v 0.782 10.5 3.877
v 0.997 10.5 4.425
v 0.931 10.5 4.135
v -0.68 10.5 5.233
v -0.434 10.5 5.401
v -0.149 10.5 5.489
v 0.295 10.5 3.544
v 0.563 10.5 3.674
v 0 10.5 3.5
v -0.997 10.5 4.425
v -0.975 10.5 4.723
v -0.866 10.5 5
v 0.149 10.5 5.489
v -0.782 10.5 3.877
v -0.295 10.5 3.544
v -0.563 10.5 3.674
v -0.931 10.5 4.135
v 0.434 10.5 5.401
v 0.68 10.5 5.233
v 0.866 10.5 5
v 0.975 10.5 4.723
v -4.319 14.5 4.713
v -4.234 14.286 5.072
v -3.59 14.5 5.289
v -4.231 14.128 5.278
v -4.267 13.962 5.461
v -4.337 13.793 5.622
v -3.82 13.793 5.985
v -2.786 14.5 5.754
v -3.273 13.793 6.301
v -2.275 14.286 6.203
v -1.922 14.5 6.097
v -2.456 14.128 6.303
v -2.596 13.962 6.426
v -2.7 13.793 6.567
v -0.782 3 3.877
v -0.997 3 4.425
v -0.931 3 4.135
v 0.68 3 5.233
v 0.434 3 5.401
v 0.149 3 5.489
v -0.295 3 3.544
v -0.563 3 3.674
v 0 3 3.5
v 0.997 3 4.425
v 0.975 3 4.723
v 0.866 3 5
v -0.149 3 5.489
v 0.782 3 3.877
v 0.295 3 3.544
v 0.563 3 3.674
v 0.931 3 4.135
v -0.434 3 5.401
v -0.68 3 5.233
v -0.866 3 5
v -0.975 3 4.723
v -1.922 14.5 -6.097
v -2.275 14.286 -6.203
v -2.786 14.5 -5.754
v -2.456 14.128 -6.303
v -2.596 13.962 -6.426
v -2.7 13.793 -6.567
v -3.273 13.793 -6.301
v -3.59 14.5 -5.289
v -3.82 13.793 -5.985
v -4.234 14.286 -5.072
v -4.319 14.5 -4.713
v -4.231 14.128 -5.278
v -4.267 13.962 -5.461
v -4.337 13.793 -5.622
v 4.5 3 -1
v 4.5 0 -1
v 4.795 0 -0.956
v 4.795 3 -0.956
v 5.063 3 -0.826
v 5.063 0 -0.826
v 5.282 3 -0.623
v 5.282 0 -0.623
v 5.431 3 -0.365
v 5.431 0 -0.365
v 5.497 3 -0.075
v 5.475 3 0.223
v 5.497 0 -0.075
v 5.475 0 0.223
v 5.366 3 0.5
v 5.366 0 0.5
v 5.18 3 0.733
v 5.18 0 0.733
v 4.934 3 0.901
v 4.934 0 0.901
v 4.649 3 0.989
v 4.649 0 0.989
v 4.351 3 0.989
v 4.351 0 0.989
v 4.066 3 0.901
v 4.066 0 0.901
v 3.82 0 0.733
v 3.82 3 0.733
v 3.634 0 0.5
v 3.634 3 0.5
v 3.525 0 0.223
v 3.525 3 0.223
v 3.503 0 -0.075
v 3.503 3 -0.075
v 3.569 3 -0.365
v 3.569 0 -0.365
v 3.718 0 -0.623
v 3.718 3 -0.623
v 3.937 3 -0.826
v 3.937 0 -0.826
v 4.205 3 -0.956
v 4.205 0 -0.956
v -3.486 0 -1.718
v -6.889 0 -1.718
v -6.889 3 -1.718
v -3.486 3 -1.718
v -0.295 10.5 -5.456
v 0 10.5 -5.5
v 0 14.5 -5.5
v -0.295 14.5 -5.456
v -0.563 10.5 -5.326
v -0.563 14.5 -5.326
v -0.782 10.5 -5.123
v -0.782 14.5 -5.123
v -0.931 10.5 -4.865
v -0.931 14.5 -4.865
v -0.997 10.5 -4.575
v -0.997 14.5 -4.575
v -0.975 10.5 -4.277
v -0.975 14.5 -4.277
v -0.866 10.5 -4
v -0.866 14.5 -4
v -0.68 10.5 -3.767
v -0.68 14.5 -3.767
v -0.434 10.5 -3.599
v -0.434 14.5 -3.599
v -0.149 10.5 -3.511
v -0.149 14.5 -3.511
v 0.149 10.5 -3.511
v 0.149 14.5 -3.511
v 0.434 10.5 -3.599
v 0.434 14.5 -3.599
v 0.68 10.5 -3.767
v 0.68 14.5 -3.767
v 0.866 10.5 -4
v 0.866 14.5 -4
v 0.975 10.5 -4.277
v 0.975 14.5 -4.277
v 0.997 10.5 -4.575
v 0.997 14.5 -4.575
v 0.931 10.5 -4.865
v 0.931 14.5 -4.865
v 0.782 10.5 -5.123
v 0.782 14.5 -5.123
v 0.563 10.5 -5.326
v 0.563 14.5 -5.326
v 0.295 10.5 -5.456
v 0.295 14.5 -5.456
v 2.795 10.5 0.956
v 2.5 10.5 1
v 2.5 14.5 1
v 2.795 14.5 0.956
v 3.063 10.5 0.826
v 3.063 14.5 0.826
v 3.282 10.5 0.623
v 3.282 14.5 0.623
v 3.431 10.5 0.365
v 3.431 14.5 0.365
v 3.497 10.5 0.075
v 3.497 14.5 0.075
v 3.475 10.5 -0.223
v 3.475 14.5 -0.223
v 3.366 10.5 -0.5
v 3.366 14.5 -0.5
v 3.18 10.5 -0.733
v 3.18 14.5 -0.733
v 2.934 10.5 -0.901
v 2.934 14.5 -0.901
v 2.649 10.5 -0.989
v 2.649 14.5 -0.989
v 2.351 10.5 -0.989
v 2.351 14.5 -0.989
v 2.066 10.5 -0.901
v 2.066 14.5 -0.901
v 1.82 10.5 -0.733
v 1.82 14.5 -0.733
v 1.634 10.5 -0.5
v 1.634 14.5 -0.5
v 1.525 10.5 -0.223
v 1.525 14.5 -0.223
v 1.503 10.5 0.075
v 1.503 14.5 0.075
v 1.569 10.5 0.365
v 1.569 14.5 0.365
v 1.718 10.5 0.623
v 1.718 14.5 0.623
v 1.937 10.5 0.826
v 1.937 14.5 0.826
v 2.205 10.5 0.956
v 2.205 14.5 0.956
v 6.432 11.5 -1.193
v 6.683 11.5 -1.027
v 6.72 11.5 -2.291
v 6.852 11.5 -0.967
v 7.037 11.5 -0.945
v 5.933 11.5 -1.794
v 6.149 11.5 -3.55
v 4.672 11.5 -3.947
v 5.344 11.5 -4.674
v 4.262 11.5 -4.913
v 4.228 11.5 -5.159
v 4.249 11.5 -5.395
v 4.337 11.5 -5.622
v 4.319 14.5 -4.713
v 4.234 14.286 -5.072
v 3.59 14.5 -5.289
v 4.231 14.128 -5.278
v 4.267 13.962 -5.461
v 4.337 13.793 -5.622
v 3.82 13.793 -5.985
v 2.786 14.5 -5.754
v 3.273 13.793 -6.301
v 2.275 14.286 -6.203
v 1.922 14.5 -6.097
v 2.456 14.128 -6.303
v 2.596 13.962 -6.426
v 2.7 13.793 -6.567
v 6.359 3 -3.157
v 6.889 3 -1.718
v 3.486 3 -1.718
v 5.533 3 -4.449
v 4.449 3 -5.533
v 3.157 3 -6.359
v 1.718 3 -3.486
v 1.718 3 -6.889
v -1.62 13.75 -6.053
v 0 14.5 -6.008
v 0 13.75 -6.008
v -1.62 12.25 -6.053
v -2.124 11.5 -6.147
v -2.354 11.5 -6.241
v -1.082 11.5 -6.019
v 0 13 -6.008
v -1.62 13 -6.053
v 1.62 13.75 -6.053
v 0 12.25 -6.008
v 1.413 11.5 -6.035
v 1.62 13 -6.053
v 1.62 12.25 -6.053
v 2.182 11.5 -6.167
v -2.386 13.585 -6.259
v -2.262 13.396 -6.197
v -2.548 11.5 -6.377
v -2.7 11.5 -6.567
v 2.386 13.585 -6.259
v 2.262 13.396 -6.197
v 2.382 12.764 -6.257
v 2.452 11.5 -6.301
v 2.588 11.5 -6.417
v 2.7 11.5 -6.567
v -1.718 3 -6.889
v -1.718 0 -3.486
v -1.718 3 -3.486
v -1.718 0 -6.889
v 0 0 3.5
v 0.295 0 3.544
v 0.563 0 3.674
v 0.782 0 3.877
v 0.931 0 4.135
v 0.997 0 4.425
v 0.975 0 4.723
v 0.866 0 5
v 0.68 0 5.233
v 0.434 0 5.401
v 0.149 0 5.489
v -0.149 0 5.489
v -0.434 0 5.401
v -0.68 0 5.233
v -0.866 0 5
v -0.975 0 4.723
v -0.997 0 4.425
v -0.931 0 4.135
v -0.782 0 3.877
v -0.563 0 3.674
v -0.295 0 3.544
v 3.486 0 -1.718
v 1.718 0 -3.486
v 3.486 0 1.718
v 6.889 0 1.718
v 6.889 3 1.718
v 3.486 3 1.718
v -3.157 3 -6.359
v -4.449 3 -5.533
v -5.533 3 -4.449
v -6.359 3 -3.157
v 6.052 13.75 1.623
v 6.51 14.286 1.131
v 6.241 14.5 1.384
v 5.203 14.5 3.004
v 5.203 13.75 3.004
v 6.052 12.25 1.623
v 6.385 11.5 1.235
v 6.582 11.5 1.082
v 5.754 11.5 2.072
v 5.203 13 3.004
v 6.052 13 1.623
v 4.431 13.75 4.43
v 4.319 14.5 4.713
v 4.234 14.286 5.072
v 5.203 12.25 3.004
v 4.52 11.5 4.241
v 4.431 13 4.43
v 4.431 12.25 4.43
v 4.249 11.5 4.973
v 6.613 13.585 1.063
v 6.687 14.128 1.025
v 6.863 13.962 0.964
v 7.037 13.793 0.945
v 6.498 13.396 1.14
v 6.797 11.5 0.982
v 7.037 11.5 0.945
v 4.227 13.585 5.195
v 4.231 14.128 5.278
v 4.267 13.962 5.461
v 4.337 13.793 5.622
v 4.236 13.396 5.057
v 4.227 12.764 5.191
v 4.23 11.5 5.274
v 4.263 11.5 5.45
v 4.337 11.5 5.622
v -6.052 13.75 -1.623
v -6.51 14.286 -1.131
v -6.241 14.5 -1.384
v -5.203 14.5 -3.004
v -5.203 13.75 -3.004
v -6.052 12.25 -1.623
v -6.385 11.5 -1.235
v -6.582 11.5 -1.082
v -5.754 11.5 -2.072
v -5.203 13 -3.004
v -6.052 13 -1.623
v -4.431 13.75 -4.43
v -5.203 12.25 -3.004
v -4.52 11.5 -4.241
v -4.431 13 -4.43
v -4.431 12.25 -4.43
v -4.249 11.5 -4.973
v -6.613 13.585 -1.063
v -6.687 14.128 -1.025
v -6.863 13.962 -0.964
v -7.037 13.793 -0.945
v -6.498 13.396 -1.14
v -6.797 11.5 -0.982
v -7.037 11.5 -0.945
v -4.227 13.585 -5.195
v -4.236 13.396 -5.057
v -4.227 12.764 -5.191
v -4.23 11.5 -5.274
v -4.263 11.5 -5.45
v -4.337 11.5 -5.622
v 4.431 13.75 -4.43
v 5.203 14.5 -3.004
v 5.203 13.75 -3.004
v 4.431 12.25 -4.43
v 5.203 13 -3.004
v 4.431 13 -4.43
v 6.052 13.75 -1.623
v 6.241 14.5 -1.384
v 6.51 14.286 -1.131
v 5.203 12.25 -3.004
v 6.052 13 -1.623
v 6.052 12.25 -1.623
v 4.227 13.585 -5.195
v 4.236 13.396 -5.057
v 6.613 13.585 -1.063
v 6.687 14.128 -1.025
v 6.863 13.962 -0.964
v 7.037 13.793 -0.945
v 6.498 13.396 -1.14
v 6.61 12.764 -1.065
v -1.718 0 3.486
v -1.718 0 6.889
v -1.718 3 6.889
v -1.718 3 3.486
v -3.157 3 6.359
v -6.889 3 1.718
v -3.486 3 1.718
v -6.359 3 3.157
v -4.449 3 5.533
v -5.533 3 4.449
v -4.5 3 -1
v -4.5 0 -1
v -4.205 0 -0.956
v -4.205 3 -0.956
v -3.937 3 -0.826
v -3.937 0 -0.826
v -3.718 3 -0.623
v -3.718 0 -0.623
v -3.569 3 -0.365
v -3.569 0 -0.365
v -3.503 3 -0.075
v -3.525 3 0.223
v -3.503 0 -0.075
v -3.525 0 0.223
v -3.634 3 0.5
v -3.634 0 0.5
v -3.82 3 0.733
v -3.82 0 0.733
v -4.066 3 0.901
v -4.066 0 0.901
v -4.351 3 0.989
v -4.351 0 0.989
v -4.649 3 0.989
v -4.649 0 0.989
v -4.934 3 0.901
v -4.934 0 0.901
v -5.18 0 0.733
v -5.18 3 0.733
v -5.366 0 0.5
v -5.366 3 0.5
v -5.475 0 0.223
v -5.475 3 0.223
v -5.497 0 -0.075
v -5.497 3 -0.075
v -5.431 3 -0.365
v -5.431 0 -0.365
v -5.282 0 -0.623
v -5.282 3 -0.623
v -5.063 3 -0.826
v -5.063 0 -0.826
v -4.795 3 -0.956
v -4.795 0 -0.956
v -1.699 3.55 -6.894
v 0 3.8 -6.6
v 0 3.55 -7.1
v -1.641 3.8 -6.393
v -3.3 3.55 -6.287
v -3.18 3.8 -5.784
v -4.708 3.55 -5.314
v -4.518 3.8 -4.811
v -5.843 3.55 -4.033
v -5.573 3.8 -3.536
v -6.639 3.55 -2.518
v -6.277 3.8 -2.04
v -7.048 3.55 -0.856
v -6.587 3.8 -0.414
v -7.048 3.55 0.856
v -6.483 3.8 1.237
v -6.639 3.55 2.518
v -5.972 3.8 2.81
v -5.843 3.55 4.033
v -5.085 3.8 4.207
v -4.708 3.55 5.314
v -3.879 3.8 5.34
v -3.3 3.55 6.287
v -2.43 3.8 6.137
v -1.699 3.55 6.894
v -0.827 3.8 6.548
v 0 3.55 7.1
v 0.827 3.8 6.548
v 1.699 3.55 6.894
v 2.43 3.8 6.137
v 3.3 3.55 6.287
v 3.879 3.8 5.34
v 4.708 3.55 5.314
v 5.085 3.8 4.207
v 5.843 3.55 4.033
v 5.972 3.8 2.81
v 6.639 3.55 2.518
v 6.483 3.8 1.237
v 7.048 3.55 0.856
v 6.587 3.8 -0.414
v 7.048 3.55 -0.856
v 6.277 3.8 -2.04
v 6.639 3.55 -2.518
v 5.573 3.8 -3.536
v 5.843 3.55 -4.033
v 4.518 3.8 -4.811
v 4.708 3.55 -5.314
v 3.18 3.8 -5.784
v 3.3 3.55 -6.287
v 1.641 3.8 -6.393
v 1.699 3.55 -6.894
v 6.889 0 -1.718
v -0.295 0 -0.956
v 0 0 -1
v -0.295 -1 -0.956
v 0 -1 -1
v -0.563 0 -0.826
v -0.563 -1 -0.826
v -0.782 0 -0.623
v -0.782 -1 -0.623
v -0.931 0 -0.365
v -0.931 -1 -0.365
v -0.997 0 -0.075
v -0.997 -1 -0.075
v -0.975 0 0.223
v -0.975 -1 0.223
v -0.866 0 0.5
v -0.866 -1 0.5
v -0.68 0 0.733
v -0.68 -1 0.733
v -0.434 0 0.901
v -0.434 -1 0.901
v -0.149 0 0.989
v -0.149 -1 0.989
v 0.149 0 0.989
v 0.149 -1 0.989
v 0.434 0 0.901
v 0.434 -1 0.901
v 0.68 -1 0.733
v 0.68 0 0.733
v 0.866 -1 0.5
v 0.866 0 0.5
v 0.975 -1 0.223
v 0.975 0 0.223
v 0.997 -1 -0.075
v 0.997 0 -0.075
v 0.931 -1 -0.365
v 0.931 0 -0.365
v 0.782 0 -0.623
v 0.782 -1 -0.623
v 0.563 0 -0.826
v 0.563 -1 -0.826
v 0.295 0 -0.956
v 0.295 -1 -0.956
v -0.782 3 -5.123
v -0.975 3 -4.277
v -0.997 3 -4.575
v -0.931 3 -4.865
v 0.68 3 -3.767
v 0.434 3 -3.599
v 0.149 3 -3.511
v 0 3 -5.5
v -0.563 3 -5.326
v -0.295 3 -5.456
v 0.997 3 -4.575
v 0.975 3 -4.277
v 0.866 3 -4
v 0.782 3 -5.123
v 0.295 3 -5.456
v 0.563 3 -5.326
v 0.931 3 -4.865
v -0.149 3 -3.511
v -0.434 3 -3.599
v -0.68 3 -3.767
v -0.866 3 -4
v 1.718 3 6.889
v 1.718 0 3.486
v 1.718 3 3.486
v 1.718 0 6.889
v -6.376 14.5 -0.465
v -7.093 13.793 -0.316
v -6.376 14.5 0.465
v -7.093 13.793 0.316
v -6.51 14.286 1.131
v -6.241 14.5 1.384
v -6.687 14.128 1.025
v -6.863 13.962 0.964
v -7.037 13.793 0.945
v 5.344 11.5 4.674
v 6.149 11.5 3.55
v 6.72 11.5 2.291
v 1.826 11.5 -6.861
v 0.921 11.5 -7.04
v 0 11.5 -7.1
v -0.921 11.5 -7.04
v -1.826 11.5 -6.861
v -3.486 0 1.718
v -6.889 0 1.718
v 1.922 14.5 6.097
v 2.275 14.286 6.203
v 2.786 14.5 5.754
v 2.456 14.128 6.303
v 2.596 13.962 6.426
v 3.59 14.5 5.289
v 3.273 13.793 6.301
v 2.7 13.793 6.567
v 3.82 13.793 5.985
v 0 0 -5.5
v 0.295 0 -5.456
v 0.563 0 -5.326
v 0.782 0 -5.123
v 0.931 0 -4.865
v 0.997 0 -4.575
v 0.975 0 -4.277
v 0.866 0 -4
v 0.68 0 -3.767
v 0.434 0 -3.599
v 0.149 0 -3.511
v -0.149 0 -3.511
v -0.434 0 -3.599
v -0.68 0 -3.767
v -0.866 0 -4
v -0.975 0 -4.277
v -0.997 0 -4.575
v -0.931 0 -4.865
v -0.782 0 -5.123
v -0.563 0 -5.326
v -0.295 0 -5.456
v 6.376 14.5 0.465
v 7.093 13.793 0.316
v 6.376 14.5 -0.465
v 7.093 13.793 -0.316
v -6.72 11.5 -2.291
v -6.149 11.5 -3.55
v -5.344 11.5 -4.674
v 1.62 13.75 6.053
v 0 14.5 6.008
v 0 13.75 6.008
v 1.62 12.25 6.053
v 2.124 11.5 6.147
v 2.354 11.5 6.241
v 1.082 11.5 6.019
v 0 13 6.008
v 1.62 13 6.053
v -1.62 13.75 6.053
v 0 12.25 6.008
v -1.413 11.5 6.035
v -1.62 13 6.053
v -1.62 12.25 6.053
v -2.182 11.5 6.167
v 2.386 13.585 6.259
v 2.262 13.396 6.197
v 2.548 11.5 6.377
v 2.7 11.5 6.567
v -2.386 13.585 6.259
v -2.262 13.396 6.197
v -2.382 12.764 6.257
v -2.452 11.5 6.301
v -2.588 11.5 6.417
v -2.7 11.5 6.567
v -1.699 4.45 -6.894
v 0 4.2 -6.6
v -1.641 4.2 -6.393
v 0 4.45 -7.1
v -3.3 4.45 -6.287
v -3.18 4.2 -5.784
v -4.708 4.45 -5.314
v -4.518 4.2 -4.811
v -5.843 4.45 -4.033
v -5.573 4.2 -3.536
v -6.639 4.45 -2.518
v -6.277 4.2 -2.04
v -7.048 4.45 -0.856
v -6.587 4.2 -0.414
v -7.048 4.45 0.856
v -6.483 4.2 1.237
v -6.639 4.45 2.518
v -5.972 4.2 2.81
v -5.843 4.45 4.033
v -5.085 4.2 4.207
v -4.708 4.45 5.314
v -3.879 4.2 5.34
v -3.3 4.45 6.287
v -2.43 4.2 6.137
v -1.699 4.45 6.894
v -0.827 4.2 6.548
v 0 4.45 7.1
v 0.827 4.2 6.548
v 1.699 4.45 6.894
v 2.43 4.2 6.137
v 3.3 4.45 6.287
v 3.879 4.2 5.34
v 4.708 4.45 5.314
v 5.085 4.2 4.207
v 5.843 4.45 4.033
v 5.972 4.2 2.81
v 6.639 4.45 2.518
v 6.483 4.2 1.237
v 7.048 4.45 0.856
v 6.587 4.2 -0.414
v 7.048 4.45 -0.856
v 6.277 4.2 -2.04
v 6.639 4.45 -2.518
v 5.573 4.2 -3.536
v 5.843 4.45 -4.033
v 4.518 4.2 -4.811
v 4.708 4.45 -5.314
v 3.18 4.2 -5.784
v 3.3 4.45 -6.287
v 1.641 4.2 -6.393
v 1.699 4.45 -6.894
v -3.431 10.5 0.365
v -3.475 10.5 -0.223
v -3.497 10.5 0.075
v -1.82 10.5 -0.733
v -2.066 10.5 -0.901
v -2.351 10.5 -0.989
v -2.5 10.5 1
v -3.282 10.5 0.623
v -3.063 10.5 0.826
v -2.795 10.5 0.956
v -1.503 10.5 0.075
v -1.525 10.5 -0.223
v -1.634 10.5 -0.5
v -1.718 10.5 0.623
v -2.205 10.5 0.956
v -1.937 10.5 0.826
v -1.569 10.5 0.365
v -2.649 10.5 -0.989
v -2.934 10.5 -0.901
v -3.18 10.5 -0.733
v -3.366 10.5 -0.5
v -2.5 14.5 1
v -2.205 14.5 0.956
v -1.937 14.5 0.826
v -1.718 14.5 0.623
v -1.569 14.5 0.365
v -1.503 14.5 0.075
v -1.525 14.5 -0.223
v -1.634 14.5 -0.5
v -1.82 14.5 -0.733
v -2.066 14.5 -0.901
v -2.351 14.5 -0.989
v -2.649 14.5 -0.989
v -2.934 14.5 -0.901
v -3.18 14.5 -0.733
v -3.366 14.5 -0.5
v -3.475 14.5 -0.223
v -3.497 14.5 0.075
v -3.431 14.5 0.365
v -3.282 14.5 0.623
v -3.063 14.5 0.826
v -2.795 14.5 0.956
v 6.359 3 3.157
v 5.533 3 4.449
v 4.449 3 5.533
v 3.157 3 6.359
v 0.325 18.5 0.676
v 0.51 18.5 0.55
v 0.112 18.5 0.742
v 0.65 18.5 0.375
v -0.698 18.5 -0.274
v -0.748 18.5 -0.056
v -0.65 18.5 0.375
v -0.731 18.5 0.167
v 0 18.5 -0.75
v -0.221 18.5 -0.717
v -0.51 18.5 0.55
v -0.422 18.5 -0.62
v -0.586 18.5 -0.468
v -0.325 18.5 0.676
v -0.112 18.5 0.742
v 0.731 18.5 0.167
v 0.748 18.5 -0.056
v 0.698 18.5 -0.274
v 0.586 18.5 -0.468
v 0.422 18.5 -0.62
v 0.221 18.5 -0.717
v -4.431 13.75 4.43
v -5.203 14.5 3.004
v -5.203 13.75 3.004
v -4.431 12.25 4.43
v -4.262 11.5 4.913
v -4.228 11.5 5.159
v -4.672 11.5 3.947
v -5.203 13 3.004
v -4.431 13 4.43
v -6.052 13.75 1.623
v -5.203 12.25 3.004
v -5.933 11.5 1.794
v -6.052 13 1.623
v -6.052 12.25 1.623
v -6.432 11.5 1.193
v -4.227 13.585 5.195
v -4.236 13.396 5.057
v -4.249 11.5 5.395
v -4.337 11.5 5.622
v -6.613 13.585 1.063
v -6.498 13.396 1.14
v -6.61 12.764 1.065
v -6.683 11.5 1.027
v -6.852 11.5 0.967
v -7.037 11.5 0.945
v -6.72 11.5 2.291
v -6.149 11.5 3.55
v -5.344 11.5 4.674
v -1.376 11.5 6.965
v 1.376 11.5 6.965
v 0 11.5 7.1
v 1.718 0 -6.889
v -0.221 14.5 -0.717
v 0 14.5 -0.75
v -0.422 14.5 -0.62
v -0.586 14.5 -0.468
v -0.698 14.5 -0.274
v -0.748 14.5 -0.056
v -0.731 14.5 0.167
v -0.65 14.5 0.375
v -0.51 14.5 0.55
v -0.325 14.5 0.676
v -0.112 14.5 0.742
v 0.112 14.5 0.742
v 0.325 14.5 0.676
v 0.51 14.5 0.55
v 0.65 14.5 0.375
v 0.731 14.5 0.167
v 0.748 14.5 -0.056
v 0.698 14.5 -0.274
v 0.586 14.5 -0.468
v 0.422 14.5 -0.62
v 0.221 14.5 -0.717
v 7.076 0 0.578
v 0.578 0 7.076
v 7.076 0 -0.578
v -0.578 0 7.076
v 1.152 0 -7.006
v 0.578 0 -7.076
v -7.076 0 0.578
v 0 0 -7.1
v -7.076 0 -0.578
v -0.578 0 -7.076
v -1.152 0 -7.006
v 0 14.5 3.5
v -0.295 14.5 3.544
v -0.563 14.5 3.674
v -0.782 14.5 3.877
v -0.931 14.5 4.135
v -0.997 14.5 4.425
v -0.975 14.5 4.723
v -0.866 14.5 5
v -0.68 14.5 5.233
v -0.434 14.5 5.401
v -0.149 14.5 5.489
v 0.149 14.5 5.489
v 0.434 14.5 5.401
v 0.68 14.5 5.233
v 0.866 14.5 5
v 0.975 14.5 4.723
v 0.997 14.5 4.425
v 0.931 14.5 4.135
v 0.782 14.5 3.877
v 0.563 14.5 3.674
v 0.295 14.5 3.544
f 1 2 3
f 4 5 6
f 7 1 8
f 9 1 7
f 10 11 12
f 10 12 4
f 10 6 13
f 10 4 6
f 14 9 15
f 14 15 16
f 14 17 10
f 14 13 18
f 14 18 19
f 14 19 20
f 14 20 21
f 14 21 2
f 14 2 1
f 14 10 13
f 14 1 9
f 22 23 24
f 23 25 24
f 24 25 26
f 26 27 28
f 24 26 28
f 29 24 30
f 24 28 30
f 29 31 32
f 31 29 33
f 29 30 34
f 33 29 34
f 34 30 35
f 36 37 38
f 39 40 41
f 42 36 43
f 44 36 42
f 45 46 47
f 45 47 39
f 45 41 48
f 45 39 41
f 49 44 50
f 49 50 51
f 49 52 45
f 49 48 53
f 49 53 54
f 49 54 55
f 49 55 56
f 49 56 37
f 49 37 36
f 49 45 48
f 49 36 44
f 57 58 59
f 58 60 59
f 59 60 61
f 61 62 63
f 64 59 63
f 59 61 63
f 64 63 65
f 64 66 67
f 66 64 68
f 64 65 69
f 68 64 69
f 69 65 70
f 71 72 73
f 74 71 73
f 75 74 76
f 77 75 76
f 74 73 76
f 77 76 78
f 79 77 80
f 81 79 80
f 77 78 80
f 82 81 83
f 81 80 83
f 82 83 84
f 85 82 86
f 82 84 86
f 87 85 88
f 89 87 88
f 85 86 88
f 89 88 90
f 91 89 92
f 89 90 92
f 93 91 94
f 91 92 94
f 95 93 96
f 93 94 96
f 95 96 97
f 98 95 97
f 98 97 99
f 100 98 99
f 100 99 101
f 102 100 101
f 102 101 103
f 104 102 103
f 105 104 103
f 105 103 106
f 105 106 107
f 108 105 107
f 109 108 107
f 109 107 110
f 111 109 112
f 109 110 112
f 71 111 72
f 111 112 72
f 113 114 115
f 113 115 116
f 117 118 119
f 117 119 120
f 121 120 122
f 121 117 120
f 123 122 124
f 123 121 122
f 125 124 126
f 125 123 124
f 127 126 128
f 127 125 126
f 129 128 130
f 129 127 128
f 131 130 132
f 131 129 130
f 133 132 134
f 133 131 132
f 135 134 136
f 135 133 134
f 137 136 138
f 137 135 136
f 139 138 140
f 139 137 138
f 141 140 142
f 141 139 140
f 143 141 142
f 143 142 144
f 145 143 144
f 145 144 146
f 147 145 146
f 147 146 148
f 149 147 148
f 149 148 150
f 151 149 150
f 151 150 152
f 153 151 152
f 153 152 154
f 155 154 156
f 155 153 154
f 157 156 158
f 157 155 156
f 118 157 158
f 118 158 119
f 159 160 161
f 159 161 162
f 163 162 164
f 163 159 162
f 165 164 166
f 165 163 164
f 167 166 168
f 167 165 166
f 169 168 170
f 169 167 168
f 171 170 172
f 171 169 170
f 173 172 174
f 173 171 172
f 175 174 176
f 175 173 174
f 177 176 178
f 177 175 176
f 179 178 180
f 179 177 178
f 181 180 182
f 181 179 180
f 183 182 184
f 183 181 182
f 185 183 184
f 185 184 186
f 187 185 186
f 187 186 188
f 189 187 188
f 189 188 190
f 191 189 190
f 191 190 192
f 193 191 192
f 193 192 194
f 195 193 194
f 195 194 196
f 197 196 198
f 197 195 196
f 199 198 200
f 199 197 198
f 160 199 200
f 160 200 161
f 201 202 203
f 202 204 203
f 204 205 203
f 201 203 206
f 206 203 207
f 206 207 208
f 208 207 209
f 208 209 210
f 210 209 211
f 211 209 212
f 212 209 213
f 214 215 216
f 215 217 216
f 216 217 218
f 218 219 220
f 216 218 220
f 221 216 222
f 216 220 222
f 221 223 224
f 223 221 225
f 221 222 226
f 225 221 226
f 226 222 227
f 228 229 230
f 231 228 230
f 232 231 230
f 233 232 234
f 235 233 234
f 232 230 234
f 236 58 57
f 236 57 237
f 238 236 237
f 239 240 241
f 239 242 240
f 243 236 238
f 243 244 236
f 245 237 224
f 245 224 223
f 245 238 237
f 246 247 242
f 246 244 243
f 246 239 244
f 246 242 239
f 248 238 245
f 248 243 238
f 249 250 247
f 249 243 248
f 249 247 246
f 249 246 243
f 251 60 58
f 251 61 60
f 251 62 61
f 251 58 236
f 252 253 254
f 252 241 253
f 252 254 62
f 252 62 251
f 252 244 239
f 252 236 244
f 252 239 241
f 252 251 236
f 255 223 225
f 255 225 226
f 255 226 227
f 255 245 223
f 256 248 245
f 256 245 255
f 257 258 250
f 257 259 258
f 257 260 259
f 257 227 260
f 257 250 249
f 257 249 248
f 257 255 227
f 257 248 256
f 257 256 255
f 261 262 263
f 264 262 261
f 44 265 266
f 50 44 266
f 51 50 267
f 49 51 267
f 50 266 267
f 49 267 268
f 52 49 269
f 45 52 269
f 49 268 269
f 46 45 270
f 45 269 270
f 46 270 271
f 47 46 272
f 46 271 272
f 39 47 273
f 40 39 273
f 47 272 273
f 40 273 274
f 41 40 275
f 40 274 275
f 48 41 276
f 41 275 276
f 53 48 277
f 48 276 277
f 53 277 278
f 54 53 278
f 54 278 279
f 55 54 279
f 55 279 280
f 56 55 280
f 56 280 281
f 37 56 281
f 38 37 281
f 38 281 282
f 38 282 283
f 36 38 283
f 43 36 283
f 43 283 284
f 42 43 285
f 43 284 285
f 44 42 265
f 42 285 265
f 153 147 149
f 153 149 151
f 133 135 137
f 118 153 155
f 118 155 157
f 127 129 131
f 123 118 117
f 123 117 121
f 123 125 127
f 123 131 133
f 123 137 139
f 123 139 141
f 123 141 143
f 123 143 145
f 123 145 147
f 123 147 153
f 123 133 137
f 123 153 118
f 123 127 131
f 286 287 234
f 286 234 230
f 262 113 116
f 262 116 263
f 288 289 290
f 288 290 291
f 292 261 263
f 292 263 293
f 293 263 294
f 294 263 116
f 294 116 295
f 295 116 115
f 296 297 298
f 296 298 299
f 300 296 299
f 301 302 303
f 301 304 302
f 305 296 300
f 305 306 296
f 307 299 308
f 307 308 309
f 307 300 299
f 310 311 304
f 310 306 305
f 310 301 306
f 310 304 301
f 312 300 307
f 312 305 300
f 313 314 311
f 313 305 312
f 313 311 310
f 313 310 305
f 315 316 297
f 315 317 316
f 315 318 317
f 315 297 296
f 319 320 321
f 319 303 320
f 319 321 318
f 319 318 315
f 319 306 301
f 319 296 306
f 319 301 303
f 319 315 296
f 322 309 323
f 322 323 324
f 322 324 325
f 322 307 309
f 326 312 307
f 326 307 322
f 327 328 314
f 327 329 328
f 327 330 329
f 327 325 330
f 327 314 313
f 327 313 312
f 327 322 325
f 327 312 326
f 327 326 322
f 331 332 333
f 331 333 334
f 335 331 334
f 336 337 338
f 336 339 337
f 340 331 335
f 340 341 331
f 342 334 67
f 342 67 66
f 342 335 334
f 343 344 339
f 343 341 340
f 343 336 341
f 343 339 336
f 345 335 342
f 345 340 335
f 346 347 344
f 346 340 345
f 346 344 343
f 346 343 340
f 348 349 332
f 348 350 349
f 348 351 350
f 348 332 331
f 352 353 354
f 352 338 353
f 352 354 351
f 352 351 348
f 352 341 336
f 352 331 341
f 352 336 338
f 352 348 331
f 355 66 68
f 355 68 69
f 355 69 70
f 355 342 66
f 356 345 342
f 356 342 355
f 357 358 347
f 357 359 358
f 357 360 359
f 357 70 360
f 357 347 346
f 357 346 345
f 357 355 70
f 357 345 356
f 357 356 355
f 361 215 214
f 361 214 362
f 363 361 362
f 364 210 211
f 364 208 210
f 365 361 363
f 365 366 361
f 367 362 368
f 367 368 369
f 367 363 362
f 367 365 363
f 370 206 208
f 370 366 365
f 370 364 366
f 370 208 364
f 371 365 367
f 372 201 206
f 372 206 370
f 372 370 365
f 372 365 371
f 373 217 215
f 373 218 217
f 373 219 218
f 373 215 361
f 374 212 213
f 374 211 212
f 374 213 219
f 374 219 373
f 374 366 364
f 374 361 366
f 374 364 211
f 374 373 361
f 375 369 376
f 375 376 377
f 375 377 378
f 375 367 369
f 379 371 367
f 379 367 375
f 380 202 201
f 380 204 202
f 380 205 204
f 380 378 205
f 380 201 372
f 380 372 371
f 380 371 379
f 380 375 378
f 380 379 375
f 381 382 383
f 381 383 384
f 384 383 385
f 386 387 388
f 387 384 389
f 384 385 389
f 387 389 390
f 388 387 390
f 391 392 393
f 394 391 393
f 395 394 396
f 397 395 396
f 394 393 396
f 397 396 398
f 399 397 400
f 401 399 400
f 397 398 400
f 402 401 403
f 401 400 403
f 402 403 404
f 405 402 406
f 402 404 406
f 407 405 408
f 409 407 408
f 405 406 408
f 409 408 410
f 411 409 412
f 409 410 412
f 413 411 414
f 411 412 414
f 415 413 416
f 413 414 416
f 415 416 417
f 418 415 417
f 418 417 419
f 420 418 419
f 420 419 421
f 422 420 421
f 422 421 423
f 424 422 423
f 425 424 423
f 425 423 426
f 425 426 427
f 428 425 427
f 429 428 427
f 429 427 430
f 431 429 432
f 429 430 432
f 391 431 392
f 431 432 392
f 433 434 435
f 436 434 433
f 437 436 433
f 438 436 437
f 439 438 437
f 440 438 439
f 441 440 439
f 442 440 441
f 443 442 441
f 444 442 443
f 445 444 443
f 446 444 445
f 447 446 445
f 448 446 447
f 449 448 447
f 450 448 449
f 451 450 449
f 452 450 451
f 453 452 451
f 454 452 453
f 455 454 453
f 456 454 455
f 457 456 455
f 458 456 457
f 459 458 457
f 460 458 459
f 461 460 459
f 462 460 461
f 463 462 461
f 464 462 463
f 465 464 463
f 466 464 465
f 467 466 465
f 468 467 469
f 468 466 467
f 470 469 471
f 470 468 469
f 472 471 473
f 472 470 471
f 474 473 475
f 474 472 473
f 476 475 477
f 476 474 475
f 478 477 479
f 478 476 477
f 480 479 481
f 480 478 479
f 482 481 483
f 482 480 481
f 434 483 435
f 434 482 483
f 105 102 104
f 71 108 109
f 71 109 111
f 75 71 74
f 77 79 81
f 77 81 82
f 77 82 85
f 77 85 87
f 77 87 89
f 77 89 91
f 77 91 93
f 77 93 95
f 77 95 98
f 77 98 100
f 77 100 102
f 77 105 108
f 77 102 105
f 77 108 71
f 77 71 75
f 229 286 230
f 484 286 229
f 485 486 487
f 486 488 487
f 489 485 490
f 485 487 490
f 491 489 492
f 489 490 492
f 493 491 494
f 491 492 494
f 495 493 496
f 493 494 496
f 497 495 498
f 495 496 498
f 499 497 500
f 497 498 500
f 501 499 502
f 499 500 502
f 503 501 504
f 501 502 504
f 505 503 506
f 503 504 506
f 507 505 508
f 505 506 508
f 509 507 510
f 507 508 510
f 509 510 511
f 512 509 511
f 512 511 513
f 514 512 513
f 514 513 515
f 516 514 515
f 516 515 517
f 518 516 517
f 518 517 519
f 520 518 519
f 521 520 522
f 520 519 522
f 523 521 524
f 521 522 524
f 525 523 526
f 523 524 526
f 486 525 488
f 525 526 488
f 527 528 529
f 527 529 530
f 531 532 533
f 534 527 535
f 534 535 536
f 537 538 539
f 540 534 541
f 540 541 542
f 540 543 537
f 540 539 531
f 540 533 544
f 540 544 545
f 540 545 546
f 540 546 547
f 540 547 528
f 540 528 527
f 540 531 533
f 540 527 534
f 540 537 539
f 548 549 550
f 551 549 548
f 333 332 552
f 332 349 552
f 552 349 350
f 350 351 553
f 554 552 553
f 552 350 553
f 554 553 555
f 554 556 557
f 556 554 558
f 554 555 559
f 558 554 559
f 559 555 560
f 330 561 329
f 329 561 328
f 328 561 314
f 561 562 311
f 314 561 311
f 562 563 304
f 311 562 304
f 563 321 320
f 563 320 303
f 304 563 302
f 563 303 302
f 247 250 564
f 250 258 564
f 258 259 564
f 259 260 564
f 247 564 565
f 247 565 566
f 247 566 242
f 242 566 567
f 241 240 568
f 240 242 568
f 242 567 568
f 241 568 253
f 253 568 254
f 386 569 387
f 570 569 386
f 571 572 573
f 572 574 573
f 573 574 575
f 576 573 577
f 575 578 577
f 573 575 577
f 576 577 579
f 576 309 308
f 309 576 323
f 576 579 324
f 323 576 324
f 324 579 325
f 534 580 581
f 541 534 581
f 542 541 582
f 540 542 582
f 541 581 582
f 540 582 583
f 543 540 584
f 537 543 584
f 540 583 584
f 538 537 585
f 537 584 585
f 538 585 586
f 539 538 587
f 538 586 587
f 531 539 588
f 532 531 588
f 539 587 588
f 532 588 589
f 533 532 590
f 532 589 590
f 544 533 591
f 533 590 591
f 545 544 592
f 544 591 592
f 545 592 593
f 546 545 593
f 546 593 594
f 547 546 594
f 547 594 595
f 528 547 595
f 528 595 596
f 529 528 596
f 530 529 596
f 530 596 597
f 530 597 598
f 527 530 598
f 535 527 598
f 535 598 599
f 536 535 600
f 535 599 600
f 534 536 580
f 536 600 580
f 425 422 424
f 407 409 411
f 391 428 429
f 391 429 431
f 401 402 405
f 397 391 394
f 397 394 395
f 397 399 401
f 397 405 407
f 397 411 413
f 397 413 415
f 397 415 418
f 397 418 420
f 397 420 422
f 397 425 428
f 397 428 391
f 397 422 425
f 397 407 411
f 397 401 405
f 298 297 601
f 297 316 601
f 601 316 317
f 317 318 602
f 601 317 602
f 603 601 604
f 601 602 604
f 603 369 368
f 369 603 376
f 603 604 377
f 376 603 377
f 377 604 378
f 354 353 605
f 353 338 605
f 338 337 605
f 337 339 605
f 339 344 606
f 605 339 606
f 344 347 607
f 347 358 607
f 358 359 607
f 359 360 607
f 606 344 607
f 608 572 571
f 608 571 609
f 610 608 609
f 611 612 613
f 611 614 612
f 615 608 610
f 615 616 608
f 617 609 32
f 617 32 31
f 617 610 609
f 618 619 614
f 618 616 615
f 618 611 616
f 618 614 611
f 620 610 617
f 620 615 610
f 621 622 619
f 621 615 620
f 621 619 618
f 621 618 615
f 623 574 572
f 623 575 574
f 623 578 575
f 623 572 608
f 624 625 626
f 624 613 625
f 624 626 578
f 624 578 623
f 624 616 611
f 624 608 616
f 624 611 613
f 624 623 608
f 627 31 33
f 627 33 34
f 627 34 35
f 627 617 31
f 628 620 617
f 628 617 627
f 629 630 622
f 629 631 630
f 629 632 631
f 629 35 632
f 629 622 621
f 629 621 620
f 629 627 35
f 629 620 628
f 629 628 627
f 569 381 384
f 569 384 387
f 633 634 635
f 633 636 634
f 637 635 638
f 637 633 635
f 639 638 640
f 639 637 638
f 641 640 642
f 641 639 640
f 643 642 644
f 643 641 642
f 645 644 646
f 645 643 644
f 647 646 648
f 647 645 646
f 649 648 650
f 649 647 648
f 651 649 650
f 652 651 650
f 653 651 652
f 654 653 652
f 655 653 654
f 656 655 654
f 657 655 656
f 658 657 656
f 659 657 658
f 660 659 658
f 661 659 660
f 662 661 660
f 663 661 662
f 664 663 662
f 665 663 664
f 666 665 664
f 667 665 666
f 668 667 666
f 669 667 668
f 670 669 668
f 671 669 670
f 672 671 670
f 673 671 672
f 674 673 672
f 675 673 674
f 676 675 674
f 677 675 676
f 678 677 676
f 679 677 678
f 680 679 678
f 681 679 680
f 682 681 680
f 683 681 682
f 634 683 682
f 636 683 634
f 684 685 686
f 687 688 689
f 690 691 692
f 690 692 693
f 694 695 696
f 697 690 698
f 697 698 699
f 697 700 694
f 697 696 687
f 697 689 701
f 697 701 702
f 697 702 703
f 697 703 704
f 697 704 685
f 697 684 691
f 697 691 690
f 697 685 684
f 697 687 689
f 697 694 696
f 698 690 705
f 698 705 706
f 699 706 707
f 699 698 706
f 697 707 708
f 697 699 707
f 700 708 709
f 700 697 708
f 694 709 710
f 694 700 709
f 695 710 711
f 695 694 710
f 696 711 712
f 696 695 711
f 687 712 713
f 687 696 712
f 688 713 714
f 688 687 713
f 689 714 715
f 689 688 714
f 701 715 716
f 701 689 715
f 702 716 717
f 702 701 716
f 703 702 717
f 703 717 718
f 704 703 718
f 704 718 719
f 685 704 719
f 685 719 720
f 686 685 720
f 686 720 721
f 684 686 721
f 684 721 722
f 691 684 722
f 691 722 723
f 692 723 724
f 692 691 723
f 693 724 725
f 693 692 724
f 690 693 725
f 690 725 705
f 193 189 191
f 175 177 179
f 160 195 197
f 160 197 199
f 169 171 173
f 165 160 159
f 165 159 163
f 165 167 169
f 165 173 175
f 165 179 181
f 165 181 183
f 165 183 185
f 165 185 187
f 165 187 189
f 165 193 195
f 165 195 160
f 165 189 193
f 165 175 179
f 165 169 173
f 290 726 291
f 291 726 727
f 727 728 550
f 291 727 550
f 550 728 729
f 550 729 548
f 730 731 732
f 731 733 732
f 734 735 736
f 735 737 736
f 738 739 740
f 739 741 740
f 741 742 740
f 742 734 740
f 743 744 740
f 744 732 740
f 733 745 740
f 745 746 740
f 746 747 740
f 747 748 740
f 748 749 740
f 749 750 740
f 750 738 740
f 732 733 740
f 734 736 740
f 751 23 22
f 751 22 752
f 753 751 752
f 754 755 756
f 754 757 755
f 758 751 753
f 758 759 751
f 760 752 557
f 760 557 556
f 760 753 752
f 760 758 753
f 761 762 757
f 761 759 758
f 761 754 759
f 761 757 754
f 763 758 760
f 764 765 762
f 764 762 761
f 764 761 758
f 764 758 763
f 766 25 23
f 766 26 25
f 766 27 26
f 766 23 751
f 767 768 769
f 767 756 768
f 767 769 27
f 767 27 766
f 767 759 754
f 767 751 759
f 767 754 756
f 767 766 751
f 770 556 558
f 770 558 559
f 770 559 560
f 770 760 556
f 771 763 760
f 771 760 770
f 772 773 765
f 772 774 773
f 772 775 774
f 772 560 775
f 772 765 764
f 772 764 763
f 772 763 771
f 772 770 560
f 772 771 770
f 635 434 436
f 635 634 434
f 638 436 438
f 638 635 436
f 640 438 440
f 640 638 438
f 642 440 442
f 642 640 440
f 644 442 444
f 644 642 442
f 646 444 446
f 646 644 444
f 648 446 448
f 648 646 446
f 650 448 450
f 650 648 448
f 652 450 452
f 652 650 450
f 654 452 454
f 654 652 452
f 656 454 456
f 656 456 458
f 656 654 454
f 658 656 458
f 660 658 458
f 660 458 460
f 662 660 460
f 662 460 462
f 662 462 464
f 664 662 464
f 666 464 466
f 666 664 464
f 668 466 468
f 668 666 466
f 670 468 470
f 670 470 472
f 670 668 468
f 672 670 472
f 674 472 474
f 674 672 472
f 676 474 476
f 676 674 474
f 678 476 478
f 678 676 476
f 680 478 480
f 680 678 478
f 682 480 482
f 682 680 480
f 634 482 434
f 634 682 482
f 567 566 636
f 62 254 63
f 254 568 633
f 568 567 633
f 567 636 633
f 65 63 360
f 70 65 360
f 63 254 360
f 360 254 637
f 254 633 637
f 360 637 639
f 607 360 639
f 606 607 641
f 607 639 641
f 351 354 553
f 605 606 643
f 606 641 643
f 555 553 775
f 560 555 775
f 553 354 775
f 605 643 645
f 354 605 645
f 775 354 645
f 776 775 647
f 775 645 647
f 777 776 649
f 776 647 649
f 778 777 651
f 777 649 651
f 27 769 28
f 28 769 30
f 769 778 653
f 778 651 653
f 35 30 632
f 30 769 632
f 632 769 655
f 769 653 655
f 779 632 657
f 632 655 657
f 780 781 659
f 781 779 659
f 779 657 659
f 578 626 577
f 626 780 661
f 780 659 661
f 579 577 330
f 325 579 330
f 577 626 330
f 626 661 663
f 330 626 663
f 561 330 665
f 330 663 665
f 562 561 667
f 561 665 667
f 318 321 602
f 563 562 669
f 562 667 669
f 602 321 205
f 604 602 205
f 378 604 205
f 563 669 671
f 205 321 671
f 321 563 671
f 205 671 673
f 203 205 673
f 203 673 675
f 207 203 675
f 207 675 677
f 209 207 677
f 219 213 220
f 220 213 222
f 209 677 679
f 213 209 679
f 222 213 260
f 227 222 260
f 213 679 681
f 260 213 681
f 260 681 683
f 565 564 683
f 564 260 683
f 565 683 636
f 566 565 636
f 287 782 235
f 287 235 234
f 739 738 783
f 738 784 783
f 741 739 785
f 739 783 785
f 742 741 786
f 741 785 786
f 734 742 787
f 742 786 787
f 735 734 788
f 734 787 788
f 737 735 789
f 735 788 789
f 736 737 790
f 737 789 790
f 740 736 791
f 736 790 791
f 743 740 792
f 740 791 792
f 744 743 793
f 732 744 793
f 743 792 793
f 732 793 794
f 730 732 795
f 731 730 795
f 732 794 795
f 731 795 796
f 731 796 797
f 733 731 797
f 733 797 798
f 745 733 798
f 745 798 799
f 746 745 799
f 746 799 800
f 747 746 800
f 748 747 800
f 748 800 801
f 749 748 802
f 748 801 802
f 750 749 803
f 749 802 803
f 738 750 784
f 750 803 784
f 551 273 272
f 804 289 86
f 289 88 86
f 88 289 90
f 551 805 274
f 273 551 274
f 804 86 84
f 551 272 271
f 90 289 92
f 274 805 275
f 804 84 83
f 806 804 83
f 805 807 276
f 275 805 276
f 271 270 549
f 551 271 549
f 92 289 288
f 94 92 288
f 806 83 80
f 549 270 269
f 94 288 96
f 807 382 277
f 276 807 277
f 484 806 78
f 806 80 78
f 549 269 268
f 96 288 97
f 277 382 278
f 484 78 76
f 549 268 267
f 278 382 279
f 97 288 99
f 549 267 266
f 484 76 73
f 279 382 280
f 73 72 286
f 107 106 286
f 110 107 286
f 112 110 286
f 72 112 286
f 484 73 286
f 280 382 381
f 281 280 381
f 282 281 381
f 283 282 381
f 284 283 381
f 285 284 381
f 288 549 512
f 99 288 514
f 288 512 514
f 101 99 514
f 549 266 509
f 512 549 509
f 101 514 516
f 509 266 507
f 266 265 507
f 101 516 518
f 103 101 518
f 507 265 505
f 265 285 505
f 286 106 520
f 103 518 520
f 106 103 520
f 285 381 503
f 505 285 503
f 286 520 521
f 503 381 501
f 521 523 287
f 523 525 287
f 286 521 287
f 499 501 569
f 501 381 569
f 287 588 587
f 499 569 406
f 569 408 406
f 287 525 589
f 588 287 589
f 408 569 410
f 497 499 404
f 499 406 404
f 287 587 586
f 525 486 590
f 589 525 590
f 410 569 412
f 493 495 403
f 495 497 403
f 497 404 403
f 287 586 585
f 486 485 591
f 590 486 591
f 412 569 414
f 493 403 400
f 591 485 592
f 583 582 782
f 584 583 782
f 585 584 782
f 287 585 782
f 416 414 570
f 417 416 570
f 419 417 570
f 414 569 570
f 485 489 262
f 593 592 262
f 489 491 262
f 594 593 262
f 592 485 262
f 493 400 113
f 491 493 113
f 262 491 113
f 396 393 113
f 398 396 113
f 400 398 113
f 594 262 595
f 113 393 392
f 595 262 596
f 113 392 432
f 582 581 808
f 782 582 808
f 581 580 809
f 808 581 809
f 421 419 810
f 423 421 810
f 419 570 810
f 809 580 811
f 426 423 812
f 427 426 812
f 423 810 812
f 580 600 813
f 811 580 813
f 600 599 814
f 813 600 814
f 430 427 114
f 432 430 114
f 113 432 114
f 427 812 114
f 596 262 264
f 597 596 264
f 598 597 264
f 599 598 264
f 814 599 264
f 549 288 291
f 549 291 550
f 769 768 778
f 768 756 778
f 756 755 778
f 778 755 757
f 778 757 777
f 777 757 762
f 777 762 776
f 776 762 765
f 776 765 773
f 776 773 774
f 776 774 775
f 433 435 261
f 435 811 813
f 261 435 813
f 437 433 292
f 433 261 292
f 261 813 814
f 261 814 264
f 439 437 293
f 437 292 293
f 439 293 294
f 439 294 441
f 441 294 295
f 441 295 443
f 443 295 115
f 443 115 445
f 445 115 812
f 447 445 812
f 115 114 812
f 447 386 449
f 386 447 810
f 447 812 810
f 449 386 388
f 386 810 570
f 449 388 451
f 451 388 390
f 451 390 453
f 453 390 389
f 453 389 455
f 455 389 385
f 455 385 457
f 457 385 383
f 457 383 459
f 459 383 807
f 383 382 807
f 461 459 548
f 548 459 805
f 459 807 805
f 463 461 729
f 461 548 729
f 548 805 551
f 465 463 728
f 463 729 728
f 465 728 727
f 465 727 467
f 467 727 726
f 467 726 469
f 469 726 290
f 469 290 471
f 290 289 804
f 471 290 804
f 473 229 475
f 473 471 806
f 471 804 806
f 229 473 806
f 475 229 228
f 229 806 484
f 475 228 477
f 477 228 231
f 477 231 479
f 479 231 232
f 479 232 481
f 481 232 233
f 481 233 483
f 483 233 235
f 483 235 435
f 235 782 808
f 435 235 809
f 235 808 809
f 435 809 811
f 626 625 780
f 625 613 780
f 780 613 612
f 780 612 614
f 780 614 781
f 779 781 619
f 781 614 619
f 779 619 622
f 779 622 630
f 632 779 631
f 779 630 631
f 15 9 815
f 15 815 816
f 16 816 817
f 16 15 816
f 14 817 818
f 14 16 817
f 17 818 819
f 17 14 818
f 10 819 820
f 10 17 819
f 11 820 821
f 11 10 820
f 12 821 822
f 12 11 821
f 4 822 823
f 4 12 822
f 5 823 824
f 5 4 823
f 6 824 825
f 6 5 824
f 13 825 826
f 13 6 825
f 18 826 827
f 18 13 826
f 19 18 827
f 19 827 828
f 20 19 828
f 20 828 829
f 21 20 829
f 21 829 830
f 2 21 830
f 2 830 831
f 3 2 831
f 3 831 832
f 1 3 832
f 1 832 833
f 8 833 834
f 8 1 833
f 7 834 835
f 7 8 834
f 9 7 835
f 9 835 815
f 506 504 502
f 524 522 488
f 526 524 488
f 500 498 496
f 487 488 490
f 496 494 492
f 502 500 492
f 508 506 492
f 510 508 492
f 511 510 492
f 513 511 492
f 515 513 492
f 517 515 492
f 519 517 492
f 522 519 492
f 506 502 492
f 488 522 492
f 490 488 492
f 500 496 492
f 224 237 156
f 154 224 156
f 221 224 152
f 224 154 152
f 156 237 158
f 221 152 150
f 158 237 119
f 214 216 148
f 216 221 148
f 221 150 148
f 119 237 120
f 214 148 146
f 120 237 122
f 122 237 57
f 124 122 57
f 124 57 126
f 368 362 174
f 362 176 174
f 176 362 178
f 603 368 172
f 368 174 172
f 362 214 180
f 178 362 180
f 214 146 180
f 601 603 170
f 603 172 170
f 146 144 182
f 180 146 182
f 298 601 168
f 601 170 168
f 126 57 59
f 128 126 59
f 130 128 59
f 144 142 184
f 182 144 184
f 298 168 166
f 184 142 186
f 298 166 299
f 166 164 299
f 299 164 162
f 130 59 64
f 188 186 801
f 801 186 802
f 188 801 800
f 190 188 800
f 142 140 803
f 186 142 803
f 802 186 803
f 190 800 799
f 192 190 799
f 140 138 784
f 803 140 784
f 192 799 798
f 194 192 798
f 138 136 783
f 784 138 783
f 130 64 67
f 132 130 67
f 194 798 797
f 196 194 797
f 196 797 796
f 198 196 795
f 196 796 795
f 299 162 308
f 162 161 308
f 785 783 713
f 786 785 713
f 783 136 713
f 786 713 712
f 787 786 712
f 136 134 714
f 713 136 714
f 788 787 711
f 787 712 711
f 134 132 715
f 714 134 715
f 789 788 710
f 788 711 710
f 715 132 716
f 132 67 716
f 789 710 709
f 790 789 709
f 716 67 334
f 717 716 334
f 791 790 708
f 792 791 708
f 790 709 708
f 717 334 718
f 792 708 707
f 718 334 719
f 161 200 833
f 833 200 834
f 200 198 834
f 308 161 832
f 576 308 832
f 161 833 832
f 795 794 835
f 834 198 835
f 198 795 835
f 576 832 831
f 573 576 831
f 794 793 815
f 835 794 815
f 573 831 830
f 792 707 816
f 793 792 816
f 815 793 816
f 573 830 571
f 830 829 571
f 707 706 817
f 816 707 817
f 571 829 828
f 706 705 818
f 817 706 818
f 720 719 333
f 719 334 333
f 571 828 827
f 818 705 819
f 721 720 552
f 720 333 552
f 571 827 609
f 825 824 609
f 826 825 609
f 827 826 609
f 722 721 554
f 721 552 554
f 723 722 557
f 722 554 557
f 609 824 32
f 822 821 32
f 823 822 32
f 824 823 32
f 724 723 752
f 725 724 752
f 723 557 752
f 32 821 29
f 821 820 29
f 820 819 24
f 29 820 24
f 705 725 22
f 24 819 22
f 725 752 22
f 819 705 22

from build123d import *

# Parameters (mm, degrees)
SKETCH3_R          = 1
CUT_EXTRUDE1_DEPTH = 3
CUT_EXTRUDE2_START = -4
SKETCH4_R          = 1
CUT_EXTRUDE2_DEPTH = 4
CUT_EXTRUDE3_START = -3
CUT_EXTRUDE3_DEPTH = 3
CUT_EXTRUDE4_DEPTH = 3


with BuildPart() as part:
    # Sketch1 → Revolve1 (revolve)
    with BuildSketch(Plane(origin=(0, 0, 0), x_dir=(0, 0, -1), z_dir=(1, 0, 0)), mode=Mode.PRIVATE) as revolve1_sk:
        Polygon((0, 18.5), (-0.75, 18.5), (-0.75, 14.5), (-6.392893219, 14.5), (-7.1, 13.792893219), (-7.1, 0), (-1, 0), (-1, -1), (0, -1), (0, 0), align=None)
    revolve(revolve1_sk.sketch.rotate(Axis((0, 0, 0), (0, 1, 0)), 180), axis=Axis((0, 0, 0), (0, 1, 0)))

    # Sketch3 → Cut-Extrude1 (cut)
    with BuildSketch(Plane.XZ):
        with Locations(Location((0, 4.5, 0), (0, 0, 270))):
            Circle(SKETCH3_R)
        with Locations(Location((4.5, 0, 0), (0, 0, 270))):
            Circle(SKETCH3_R)
        with Locations(Location((-4.5, 0, 0), (0, 0, 270))):
            Circle(SKETCH3_R)
        with Locations(Location((0, -4.5, 0), (0, 0, 270))):
            Circle(SKETCH3_R)
    extrude(amount=-CUT_EXTRUDE1_DEPTH, mode=Mode.SUBTRACT)

    # Sketch4 → Cut-Extrude2 (cut)
    with BuildSketch(Plane(origin=(0, 14.5, 0), x_dir=(1, 0, 0), z_dir=(0, 1, 0)).offset(CUT_EXTRUDE2_START)):
        with Locations(Location((0, 4.5, 0), (0, 0, 90))):
            Circle(SKETCH4_R)
        with Locations(Location((2.5, 0, 0), (0, 0, 270))):
            Circle(SKETCH4_R)
        with Locations(Location((0, -4.5, 0), (0, 0, 90))):
            Circle(SKETCH4_R)
        with Locations(Location((-2.5, 0, 0), (0, 0, 270))):
            Circle(SKETCH4_R)
    extrude(amount=CUT_EXTRUDE2_DEPTH, mode=Mode.SUBTRACT)

    # Sketch5 → Cut-Extrude3 (cut)
    with BuildSketch(Plane(origin=(0, 14.5, 0), x_dir=(1, 0, 0), z_dir=(0, 1, 0)).offset(CUT_EXTRUDE3_START)):
        with BuildLine():
            ThreePointArc((-2.7, 6.566582064), (0, 7.1), (2.7, 6.566582064))
            add(Edge.make_bspline(
                [(-2.7, 6.566582064), (-2.071231518, 5.5), (0, 6.5), (2.071231518, 5.5), (2.7, 6.566582064)],
                knots=[0, 0, 0, 0, 0, 1, 1, 1, 1, 1], degree=4))
        make_face()
        with BuildLine():
            ThreePointArc((4.336826883, 5.621559622), (6.148780367, 3.55), (7.036826883, 0.945022442))
            add(Edge.make_bspline(
                [(4.336826883, 5.621559622), (3.727523962, 4.543739111), (5.629165125, 3.25), (5.79875548, 0.956260889), (7.036826883, 0.945022442)],
                knots=[0, 0, 0, 0, 0, 1, 1, 1, 1, 1], degree=4))
        make_face()
        with BuildLine():
            ThreePointArc((7.036826883, -0.945022442), (6.148780367, -3.55), (4.336826883, -5.621559622))
            add(Edge.make_bspline(
                [(7.036826883, -0.945022442), (5.79875548, -0.956260889), (5.629165125, -3.25), (3.727523962, -4.543739111), (4.336826883, -5.621559622)],
                knots=[0, 0, 0, 0, 0, 1, 1, 1, 1, 1], degree=4))
        make_face()
        with BuildLine():
            ThreePointArc((2.7, -6.566582064), (0, -7.1), (-2.7, -6.566582064))
            add(Edge.make_bspline(
                [(2.7, -6.566582064), (2.071231518, -5.5), (0, -6.5), (-2.071231518, -5.5), (-2.7, -6.566582064)],
                knots=[0, 0, 0, 0, 0, 1, 1, 1, 1, 1], degree=4))
        make_face()
        with BuildLine():
            ThreePointArc((-4.336826883, -5.621559622), (-6.148780367, -3.55), (-7.036826883, -0.945022442))
            add(Edge.make_bspline(
                [(-4.336826883, -5.621559622), (-3.727523962, -4.543739111), (-5.629165125, -3.25), (-5.79875548, -0.956260889), (-7.036826883, -0.945022442)],
                knots=[0, 0, 0, 0, 0, 1, 1, 1, 1, 1], degree=4))
        make_face()
        with BuildLine():
            ThreePointArc((-7.036826883, 0.945022442), (-6.148780367, 3.55), (-4.336826883, 5.621559622))
            add(Edge.make_bspline(
                [(-7.036826883, 0.945022442), (-5.79875548, 0.956260889), (-5.629165125, 3.25), (-3.727523962, 4.543739111), (-4.336826883, 5.621559622)],
                knots=[0, 0, 0, 0, 0, 1, 1, 1, 1, 1], degree=4))
        make_face()
    extrude(amount=CUT_EXTRUDE3_DEPTH, mode=Mode.SUBTRACT)

    # Sketch6 → Cut-Extrude4 (cut)
    with BuildSketch(Plane.XZ):
        with BuildLine():
            Line((-1.718410499, 6.888908866), (-1.718410499, 3.486177452))
            Line((-1.718410499, 3.486177452), (-3.486177452, 1.718410499))
            Line((-3.486177452, 1.718410499), (-6.888908866, 1.718410499))
            ThreePointArc((-6.888908866, 1.718410499), (-5.020458146, 5.020458146), (-1.718410499, 6.888908866))
        make_face()
        with BuildLine():
            Line((1.718410499, 3.486177452), (1.718410499, 6.888908866))
            ThreePointArc((1.718410499, 6.888908866), (5.020458146, 5.020458146), (6.888908866, 1.718410499))
            Line((6.888908866, 1.718410499), (3.486177452, 1.718410499))
            Line((3.486177452, 1.718410499), (1.718410499, 3.486177452))
        make_face()
        with BuildLine():
            Line((3.486177452, -1.718410499), (6.888908866, -1.718410499))
            ThreePointArc((6.888908866, -1.718410499), (5.020458146, -5.020458146), (1.718410499, -6.888908866))
            Line((1.718410499, -6.888908866), (1.718410499, -3.486177452))
            Line((1.718410499, -3.486177452), (3.486177452, -1.718410499))
        make_face()
        with BuildLine():
            Line((-1.718410499, -3.486177452), (-1.718410499, -6.888908866))
            ThreePointArc((-1.718410499, -6.888908866), (-5.020458146, -5.020458146), (-6.888908866, -1.718410499))
            Line((-6.888908866, -1.718410499), (-3.486177452, -1.718410499))
            Line((-3.486177452, -1.718410499), (-1.718410499, -3.486177452))
        make_face()
    extrude(amount=-CUT_EXTRUDE4_DEPTH, mode=Mode.SUBTRACT)

    # Sketch7 → Cut-Revolve1 (revolve, cut)
    with BuildSketch(Plane(origin=(0, 0, 0), x_dir=(0, 0, -1), z_dir=(1, 0, 0)), mode=Mode.PRIVATE) as cut_revolve1_sk:
        Polygon((-7.1, 3.55), (-6.6, 3.8), (-6.6, 4.2), (-7.1, 4.45), align=None)
    revolve(cut_revolve1_sk.sketch.rotate(Axis((0, 0, 0), (0, 1, 0)), 180), axis=Axis((0, 0, 0), (0, 1, 0)), mode=Mode.SUBTRACT)


solid = part.part
